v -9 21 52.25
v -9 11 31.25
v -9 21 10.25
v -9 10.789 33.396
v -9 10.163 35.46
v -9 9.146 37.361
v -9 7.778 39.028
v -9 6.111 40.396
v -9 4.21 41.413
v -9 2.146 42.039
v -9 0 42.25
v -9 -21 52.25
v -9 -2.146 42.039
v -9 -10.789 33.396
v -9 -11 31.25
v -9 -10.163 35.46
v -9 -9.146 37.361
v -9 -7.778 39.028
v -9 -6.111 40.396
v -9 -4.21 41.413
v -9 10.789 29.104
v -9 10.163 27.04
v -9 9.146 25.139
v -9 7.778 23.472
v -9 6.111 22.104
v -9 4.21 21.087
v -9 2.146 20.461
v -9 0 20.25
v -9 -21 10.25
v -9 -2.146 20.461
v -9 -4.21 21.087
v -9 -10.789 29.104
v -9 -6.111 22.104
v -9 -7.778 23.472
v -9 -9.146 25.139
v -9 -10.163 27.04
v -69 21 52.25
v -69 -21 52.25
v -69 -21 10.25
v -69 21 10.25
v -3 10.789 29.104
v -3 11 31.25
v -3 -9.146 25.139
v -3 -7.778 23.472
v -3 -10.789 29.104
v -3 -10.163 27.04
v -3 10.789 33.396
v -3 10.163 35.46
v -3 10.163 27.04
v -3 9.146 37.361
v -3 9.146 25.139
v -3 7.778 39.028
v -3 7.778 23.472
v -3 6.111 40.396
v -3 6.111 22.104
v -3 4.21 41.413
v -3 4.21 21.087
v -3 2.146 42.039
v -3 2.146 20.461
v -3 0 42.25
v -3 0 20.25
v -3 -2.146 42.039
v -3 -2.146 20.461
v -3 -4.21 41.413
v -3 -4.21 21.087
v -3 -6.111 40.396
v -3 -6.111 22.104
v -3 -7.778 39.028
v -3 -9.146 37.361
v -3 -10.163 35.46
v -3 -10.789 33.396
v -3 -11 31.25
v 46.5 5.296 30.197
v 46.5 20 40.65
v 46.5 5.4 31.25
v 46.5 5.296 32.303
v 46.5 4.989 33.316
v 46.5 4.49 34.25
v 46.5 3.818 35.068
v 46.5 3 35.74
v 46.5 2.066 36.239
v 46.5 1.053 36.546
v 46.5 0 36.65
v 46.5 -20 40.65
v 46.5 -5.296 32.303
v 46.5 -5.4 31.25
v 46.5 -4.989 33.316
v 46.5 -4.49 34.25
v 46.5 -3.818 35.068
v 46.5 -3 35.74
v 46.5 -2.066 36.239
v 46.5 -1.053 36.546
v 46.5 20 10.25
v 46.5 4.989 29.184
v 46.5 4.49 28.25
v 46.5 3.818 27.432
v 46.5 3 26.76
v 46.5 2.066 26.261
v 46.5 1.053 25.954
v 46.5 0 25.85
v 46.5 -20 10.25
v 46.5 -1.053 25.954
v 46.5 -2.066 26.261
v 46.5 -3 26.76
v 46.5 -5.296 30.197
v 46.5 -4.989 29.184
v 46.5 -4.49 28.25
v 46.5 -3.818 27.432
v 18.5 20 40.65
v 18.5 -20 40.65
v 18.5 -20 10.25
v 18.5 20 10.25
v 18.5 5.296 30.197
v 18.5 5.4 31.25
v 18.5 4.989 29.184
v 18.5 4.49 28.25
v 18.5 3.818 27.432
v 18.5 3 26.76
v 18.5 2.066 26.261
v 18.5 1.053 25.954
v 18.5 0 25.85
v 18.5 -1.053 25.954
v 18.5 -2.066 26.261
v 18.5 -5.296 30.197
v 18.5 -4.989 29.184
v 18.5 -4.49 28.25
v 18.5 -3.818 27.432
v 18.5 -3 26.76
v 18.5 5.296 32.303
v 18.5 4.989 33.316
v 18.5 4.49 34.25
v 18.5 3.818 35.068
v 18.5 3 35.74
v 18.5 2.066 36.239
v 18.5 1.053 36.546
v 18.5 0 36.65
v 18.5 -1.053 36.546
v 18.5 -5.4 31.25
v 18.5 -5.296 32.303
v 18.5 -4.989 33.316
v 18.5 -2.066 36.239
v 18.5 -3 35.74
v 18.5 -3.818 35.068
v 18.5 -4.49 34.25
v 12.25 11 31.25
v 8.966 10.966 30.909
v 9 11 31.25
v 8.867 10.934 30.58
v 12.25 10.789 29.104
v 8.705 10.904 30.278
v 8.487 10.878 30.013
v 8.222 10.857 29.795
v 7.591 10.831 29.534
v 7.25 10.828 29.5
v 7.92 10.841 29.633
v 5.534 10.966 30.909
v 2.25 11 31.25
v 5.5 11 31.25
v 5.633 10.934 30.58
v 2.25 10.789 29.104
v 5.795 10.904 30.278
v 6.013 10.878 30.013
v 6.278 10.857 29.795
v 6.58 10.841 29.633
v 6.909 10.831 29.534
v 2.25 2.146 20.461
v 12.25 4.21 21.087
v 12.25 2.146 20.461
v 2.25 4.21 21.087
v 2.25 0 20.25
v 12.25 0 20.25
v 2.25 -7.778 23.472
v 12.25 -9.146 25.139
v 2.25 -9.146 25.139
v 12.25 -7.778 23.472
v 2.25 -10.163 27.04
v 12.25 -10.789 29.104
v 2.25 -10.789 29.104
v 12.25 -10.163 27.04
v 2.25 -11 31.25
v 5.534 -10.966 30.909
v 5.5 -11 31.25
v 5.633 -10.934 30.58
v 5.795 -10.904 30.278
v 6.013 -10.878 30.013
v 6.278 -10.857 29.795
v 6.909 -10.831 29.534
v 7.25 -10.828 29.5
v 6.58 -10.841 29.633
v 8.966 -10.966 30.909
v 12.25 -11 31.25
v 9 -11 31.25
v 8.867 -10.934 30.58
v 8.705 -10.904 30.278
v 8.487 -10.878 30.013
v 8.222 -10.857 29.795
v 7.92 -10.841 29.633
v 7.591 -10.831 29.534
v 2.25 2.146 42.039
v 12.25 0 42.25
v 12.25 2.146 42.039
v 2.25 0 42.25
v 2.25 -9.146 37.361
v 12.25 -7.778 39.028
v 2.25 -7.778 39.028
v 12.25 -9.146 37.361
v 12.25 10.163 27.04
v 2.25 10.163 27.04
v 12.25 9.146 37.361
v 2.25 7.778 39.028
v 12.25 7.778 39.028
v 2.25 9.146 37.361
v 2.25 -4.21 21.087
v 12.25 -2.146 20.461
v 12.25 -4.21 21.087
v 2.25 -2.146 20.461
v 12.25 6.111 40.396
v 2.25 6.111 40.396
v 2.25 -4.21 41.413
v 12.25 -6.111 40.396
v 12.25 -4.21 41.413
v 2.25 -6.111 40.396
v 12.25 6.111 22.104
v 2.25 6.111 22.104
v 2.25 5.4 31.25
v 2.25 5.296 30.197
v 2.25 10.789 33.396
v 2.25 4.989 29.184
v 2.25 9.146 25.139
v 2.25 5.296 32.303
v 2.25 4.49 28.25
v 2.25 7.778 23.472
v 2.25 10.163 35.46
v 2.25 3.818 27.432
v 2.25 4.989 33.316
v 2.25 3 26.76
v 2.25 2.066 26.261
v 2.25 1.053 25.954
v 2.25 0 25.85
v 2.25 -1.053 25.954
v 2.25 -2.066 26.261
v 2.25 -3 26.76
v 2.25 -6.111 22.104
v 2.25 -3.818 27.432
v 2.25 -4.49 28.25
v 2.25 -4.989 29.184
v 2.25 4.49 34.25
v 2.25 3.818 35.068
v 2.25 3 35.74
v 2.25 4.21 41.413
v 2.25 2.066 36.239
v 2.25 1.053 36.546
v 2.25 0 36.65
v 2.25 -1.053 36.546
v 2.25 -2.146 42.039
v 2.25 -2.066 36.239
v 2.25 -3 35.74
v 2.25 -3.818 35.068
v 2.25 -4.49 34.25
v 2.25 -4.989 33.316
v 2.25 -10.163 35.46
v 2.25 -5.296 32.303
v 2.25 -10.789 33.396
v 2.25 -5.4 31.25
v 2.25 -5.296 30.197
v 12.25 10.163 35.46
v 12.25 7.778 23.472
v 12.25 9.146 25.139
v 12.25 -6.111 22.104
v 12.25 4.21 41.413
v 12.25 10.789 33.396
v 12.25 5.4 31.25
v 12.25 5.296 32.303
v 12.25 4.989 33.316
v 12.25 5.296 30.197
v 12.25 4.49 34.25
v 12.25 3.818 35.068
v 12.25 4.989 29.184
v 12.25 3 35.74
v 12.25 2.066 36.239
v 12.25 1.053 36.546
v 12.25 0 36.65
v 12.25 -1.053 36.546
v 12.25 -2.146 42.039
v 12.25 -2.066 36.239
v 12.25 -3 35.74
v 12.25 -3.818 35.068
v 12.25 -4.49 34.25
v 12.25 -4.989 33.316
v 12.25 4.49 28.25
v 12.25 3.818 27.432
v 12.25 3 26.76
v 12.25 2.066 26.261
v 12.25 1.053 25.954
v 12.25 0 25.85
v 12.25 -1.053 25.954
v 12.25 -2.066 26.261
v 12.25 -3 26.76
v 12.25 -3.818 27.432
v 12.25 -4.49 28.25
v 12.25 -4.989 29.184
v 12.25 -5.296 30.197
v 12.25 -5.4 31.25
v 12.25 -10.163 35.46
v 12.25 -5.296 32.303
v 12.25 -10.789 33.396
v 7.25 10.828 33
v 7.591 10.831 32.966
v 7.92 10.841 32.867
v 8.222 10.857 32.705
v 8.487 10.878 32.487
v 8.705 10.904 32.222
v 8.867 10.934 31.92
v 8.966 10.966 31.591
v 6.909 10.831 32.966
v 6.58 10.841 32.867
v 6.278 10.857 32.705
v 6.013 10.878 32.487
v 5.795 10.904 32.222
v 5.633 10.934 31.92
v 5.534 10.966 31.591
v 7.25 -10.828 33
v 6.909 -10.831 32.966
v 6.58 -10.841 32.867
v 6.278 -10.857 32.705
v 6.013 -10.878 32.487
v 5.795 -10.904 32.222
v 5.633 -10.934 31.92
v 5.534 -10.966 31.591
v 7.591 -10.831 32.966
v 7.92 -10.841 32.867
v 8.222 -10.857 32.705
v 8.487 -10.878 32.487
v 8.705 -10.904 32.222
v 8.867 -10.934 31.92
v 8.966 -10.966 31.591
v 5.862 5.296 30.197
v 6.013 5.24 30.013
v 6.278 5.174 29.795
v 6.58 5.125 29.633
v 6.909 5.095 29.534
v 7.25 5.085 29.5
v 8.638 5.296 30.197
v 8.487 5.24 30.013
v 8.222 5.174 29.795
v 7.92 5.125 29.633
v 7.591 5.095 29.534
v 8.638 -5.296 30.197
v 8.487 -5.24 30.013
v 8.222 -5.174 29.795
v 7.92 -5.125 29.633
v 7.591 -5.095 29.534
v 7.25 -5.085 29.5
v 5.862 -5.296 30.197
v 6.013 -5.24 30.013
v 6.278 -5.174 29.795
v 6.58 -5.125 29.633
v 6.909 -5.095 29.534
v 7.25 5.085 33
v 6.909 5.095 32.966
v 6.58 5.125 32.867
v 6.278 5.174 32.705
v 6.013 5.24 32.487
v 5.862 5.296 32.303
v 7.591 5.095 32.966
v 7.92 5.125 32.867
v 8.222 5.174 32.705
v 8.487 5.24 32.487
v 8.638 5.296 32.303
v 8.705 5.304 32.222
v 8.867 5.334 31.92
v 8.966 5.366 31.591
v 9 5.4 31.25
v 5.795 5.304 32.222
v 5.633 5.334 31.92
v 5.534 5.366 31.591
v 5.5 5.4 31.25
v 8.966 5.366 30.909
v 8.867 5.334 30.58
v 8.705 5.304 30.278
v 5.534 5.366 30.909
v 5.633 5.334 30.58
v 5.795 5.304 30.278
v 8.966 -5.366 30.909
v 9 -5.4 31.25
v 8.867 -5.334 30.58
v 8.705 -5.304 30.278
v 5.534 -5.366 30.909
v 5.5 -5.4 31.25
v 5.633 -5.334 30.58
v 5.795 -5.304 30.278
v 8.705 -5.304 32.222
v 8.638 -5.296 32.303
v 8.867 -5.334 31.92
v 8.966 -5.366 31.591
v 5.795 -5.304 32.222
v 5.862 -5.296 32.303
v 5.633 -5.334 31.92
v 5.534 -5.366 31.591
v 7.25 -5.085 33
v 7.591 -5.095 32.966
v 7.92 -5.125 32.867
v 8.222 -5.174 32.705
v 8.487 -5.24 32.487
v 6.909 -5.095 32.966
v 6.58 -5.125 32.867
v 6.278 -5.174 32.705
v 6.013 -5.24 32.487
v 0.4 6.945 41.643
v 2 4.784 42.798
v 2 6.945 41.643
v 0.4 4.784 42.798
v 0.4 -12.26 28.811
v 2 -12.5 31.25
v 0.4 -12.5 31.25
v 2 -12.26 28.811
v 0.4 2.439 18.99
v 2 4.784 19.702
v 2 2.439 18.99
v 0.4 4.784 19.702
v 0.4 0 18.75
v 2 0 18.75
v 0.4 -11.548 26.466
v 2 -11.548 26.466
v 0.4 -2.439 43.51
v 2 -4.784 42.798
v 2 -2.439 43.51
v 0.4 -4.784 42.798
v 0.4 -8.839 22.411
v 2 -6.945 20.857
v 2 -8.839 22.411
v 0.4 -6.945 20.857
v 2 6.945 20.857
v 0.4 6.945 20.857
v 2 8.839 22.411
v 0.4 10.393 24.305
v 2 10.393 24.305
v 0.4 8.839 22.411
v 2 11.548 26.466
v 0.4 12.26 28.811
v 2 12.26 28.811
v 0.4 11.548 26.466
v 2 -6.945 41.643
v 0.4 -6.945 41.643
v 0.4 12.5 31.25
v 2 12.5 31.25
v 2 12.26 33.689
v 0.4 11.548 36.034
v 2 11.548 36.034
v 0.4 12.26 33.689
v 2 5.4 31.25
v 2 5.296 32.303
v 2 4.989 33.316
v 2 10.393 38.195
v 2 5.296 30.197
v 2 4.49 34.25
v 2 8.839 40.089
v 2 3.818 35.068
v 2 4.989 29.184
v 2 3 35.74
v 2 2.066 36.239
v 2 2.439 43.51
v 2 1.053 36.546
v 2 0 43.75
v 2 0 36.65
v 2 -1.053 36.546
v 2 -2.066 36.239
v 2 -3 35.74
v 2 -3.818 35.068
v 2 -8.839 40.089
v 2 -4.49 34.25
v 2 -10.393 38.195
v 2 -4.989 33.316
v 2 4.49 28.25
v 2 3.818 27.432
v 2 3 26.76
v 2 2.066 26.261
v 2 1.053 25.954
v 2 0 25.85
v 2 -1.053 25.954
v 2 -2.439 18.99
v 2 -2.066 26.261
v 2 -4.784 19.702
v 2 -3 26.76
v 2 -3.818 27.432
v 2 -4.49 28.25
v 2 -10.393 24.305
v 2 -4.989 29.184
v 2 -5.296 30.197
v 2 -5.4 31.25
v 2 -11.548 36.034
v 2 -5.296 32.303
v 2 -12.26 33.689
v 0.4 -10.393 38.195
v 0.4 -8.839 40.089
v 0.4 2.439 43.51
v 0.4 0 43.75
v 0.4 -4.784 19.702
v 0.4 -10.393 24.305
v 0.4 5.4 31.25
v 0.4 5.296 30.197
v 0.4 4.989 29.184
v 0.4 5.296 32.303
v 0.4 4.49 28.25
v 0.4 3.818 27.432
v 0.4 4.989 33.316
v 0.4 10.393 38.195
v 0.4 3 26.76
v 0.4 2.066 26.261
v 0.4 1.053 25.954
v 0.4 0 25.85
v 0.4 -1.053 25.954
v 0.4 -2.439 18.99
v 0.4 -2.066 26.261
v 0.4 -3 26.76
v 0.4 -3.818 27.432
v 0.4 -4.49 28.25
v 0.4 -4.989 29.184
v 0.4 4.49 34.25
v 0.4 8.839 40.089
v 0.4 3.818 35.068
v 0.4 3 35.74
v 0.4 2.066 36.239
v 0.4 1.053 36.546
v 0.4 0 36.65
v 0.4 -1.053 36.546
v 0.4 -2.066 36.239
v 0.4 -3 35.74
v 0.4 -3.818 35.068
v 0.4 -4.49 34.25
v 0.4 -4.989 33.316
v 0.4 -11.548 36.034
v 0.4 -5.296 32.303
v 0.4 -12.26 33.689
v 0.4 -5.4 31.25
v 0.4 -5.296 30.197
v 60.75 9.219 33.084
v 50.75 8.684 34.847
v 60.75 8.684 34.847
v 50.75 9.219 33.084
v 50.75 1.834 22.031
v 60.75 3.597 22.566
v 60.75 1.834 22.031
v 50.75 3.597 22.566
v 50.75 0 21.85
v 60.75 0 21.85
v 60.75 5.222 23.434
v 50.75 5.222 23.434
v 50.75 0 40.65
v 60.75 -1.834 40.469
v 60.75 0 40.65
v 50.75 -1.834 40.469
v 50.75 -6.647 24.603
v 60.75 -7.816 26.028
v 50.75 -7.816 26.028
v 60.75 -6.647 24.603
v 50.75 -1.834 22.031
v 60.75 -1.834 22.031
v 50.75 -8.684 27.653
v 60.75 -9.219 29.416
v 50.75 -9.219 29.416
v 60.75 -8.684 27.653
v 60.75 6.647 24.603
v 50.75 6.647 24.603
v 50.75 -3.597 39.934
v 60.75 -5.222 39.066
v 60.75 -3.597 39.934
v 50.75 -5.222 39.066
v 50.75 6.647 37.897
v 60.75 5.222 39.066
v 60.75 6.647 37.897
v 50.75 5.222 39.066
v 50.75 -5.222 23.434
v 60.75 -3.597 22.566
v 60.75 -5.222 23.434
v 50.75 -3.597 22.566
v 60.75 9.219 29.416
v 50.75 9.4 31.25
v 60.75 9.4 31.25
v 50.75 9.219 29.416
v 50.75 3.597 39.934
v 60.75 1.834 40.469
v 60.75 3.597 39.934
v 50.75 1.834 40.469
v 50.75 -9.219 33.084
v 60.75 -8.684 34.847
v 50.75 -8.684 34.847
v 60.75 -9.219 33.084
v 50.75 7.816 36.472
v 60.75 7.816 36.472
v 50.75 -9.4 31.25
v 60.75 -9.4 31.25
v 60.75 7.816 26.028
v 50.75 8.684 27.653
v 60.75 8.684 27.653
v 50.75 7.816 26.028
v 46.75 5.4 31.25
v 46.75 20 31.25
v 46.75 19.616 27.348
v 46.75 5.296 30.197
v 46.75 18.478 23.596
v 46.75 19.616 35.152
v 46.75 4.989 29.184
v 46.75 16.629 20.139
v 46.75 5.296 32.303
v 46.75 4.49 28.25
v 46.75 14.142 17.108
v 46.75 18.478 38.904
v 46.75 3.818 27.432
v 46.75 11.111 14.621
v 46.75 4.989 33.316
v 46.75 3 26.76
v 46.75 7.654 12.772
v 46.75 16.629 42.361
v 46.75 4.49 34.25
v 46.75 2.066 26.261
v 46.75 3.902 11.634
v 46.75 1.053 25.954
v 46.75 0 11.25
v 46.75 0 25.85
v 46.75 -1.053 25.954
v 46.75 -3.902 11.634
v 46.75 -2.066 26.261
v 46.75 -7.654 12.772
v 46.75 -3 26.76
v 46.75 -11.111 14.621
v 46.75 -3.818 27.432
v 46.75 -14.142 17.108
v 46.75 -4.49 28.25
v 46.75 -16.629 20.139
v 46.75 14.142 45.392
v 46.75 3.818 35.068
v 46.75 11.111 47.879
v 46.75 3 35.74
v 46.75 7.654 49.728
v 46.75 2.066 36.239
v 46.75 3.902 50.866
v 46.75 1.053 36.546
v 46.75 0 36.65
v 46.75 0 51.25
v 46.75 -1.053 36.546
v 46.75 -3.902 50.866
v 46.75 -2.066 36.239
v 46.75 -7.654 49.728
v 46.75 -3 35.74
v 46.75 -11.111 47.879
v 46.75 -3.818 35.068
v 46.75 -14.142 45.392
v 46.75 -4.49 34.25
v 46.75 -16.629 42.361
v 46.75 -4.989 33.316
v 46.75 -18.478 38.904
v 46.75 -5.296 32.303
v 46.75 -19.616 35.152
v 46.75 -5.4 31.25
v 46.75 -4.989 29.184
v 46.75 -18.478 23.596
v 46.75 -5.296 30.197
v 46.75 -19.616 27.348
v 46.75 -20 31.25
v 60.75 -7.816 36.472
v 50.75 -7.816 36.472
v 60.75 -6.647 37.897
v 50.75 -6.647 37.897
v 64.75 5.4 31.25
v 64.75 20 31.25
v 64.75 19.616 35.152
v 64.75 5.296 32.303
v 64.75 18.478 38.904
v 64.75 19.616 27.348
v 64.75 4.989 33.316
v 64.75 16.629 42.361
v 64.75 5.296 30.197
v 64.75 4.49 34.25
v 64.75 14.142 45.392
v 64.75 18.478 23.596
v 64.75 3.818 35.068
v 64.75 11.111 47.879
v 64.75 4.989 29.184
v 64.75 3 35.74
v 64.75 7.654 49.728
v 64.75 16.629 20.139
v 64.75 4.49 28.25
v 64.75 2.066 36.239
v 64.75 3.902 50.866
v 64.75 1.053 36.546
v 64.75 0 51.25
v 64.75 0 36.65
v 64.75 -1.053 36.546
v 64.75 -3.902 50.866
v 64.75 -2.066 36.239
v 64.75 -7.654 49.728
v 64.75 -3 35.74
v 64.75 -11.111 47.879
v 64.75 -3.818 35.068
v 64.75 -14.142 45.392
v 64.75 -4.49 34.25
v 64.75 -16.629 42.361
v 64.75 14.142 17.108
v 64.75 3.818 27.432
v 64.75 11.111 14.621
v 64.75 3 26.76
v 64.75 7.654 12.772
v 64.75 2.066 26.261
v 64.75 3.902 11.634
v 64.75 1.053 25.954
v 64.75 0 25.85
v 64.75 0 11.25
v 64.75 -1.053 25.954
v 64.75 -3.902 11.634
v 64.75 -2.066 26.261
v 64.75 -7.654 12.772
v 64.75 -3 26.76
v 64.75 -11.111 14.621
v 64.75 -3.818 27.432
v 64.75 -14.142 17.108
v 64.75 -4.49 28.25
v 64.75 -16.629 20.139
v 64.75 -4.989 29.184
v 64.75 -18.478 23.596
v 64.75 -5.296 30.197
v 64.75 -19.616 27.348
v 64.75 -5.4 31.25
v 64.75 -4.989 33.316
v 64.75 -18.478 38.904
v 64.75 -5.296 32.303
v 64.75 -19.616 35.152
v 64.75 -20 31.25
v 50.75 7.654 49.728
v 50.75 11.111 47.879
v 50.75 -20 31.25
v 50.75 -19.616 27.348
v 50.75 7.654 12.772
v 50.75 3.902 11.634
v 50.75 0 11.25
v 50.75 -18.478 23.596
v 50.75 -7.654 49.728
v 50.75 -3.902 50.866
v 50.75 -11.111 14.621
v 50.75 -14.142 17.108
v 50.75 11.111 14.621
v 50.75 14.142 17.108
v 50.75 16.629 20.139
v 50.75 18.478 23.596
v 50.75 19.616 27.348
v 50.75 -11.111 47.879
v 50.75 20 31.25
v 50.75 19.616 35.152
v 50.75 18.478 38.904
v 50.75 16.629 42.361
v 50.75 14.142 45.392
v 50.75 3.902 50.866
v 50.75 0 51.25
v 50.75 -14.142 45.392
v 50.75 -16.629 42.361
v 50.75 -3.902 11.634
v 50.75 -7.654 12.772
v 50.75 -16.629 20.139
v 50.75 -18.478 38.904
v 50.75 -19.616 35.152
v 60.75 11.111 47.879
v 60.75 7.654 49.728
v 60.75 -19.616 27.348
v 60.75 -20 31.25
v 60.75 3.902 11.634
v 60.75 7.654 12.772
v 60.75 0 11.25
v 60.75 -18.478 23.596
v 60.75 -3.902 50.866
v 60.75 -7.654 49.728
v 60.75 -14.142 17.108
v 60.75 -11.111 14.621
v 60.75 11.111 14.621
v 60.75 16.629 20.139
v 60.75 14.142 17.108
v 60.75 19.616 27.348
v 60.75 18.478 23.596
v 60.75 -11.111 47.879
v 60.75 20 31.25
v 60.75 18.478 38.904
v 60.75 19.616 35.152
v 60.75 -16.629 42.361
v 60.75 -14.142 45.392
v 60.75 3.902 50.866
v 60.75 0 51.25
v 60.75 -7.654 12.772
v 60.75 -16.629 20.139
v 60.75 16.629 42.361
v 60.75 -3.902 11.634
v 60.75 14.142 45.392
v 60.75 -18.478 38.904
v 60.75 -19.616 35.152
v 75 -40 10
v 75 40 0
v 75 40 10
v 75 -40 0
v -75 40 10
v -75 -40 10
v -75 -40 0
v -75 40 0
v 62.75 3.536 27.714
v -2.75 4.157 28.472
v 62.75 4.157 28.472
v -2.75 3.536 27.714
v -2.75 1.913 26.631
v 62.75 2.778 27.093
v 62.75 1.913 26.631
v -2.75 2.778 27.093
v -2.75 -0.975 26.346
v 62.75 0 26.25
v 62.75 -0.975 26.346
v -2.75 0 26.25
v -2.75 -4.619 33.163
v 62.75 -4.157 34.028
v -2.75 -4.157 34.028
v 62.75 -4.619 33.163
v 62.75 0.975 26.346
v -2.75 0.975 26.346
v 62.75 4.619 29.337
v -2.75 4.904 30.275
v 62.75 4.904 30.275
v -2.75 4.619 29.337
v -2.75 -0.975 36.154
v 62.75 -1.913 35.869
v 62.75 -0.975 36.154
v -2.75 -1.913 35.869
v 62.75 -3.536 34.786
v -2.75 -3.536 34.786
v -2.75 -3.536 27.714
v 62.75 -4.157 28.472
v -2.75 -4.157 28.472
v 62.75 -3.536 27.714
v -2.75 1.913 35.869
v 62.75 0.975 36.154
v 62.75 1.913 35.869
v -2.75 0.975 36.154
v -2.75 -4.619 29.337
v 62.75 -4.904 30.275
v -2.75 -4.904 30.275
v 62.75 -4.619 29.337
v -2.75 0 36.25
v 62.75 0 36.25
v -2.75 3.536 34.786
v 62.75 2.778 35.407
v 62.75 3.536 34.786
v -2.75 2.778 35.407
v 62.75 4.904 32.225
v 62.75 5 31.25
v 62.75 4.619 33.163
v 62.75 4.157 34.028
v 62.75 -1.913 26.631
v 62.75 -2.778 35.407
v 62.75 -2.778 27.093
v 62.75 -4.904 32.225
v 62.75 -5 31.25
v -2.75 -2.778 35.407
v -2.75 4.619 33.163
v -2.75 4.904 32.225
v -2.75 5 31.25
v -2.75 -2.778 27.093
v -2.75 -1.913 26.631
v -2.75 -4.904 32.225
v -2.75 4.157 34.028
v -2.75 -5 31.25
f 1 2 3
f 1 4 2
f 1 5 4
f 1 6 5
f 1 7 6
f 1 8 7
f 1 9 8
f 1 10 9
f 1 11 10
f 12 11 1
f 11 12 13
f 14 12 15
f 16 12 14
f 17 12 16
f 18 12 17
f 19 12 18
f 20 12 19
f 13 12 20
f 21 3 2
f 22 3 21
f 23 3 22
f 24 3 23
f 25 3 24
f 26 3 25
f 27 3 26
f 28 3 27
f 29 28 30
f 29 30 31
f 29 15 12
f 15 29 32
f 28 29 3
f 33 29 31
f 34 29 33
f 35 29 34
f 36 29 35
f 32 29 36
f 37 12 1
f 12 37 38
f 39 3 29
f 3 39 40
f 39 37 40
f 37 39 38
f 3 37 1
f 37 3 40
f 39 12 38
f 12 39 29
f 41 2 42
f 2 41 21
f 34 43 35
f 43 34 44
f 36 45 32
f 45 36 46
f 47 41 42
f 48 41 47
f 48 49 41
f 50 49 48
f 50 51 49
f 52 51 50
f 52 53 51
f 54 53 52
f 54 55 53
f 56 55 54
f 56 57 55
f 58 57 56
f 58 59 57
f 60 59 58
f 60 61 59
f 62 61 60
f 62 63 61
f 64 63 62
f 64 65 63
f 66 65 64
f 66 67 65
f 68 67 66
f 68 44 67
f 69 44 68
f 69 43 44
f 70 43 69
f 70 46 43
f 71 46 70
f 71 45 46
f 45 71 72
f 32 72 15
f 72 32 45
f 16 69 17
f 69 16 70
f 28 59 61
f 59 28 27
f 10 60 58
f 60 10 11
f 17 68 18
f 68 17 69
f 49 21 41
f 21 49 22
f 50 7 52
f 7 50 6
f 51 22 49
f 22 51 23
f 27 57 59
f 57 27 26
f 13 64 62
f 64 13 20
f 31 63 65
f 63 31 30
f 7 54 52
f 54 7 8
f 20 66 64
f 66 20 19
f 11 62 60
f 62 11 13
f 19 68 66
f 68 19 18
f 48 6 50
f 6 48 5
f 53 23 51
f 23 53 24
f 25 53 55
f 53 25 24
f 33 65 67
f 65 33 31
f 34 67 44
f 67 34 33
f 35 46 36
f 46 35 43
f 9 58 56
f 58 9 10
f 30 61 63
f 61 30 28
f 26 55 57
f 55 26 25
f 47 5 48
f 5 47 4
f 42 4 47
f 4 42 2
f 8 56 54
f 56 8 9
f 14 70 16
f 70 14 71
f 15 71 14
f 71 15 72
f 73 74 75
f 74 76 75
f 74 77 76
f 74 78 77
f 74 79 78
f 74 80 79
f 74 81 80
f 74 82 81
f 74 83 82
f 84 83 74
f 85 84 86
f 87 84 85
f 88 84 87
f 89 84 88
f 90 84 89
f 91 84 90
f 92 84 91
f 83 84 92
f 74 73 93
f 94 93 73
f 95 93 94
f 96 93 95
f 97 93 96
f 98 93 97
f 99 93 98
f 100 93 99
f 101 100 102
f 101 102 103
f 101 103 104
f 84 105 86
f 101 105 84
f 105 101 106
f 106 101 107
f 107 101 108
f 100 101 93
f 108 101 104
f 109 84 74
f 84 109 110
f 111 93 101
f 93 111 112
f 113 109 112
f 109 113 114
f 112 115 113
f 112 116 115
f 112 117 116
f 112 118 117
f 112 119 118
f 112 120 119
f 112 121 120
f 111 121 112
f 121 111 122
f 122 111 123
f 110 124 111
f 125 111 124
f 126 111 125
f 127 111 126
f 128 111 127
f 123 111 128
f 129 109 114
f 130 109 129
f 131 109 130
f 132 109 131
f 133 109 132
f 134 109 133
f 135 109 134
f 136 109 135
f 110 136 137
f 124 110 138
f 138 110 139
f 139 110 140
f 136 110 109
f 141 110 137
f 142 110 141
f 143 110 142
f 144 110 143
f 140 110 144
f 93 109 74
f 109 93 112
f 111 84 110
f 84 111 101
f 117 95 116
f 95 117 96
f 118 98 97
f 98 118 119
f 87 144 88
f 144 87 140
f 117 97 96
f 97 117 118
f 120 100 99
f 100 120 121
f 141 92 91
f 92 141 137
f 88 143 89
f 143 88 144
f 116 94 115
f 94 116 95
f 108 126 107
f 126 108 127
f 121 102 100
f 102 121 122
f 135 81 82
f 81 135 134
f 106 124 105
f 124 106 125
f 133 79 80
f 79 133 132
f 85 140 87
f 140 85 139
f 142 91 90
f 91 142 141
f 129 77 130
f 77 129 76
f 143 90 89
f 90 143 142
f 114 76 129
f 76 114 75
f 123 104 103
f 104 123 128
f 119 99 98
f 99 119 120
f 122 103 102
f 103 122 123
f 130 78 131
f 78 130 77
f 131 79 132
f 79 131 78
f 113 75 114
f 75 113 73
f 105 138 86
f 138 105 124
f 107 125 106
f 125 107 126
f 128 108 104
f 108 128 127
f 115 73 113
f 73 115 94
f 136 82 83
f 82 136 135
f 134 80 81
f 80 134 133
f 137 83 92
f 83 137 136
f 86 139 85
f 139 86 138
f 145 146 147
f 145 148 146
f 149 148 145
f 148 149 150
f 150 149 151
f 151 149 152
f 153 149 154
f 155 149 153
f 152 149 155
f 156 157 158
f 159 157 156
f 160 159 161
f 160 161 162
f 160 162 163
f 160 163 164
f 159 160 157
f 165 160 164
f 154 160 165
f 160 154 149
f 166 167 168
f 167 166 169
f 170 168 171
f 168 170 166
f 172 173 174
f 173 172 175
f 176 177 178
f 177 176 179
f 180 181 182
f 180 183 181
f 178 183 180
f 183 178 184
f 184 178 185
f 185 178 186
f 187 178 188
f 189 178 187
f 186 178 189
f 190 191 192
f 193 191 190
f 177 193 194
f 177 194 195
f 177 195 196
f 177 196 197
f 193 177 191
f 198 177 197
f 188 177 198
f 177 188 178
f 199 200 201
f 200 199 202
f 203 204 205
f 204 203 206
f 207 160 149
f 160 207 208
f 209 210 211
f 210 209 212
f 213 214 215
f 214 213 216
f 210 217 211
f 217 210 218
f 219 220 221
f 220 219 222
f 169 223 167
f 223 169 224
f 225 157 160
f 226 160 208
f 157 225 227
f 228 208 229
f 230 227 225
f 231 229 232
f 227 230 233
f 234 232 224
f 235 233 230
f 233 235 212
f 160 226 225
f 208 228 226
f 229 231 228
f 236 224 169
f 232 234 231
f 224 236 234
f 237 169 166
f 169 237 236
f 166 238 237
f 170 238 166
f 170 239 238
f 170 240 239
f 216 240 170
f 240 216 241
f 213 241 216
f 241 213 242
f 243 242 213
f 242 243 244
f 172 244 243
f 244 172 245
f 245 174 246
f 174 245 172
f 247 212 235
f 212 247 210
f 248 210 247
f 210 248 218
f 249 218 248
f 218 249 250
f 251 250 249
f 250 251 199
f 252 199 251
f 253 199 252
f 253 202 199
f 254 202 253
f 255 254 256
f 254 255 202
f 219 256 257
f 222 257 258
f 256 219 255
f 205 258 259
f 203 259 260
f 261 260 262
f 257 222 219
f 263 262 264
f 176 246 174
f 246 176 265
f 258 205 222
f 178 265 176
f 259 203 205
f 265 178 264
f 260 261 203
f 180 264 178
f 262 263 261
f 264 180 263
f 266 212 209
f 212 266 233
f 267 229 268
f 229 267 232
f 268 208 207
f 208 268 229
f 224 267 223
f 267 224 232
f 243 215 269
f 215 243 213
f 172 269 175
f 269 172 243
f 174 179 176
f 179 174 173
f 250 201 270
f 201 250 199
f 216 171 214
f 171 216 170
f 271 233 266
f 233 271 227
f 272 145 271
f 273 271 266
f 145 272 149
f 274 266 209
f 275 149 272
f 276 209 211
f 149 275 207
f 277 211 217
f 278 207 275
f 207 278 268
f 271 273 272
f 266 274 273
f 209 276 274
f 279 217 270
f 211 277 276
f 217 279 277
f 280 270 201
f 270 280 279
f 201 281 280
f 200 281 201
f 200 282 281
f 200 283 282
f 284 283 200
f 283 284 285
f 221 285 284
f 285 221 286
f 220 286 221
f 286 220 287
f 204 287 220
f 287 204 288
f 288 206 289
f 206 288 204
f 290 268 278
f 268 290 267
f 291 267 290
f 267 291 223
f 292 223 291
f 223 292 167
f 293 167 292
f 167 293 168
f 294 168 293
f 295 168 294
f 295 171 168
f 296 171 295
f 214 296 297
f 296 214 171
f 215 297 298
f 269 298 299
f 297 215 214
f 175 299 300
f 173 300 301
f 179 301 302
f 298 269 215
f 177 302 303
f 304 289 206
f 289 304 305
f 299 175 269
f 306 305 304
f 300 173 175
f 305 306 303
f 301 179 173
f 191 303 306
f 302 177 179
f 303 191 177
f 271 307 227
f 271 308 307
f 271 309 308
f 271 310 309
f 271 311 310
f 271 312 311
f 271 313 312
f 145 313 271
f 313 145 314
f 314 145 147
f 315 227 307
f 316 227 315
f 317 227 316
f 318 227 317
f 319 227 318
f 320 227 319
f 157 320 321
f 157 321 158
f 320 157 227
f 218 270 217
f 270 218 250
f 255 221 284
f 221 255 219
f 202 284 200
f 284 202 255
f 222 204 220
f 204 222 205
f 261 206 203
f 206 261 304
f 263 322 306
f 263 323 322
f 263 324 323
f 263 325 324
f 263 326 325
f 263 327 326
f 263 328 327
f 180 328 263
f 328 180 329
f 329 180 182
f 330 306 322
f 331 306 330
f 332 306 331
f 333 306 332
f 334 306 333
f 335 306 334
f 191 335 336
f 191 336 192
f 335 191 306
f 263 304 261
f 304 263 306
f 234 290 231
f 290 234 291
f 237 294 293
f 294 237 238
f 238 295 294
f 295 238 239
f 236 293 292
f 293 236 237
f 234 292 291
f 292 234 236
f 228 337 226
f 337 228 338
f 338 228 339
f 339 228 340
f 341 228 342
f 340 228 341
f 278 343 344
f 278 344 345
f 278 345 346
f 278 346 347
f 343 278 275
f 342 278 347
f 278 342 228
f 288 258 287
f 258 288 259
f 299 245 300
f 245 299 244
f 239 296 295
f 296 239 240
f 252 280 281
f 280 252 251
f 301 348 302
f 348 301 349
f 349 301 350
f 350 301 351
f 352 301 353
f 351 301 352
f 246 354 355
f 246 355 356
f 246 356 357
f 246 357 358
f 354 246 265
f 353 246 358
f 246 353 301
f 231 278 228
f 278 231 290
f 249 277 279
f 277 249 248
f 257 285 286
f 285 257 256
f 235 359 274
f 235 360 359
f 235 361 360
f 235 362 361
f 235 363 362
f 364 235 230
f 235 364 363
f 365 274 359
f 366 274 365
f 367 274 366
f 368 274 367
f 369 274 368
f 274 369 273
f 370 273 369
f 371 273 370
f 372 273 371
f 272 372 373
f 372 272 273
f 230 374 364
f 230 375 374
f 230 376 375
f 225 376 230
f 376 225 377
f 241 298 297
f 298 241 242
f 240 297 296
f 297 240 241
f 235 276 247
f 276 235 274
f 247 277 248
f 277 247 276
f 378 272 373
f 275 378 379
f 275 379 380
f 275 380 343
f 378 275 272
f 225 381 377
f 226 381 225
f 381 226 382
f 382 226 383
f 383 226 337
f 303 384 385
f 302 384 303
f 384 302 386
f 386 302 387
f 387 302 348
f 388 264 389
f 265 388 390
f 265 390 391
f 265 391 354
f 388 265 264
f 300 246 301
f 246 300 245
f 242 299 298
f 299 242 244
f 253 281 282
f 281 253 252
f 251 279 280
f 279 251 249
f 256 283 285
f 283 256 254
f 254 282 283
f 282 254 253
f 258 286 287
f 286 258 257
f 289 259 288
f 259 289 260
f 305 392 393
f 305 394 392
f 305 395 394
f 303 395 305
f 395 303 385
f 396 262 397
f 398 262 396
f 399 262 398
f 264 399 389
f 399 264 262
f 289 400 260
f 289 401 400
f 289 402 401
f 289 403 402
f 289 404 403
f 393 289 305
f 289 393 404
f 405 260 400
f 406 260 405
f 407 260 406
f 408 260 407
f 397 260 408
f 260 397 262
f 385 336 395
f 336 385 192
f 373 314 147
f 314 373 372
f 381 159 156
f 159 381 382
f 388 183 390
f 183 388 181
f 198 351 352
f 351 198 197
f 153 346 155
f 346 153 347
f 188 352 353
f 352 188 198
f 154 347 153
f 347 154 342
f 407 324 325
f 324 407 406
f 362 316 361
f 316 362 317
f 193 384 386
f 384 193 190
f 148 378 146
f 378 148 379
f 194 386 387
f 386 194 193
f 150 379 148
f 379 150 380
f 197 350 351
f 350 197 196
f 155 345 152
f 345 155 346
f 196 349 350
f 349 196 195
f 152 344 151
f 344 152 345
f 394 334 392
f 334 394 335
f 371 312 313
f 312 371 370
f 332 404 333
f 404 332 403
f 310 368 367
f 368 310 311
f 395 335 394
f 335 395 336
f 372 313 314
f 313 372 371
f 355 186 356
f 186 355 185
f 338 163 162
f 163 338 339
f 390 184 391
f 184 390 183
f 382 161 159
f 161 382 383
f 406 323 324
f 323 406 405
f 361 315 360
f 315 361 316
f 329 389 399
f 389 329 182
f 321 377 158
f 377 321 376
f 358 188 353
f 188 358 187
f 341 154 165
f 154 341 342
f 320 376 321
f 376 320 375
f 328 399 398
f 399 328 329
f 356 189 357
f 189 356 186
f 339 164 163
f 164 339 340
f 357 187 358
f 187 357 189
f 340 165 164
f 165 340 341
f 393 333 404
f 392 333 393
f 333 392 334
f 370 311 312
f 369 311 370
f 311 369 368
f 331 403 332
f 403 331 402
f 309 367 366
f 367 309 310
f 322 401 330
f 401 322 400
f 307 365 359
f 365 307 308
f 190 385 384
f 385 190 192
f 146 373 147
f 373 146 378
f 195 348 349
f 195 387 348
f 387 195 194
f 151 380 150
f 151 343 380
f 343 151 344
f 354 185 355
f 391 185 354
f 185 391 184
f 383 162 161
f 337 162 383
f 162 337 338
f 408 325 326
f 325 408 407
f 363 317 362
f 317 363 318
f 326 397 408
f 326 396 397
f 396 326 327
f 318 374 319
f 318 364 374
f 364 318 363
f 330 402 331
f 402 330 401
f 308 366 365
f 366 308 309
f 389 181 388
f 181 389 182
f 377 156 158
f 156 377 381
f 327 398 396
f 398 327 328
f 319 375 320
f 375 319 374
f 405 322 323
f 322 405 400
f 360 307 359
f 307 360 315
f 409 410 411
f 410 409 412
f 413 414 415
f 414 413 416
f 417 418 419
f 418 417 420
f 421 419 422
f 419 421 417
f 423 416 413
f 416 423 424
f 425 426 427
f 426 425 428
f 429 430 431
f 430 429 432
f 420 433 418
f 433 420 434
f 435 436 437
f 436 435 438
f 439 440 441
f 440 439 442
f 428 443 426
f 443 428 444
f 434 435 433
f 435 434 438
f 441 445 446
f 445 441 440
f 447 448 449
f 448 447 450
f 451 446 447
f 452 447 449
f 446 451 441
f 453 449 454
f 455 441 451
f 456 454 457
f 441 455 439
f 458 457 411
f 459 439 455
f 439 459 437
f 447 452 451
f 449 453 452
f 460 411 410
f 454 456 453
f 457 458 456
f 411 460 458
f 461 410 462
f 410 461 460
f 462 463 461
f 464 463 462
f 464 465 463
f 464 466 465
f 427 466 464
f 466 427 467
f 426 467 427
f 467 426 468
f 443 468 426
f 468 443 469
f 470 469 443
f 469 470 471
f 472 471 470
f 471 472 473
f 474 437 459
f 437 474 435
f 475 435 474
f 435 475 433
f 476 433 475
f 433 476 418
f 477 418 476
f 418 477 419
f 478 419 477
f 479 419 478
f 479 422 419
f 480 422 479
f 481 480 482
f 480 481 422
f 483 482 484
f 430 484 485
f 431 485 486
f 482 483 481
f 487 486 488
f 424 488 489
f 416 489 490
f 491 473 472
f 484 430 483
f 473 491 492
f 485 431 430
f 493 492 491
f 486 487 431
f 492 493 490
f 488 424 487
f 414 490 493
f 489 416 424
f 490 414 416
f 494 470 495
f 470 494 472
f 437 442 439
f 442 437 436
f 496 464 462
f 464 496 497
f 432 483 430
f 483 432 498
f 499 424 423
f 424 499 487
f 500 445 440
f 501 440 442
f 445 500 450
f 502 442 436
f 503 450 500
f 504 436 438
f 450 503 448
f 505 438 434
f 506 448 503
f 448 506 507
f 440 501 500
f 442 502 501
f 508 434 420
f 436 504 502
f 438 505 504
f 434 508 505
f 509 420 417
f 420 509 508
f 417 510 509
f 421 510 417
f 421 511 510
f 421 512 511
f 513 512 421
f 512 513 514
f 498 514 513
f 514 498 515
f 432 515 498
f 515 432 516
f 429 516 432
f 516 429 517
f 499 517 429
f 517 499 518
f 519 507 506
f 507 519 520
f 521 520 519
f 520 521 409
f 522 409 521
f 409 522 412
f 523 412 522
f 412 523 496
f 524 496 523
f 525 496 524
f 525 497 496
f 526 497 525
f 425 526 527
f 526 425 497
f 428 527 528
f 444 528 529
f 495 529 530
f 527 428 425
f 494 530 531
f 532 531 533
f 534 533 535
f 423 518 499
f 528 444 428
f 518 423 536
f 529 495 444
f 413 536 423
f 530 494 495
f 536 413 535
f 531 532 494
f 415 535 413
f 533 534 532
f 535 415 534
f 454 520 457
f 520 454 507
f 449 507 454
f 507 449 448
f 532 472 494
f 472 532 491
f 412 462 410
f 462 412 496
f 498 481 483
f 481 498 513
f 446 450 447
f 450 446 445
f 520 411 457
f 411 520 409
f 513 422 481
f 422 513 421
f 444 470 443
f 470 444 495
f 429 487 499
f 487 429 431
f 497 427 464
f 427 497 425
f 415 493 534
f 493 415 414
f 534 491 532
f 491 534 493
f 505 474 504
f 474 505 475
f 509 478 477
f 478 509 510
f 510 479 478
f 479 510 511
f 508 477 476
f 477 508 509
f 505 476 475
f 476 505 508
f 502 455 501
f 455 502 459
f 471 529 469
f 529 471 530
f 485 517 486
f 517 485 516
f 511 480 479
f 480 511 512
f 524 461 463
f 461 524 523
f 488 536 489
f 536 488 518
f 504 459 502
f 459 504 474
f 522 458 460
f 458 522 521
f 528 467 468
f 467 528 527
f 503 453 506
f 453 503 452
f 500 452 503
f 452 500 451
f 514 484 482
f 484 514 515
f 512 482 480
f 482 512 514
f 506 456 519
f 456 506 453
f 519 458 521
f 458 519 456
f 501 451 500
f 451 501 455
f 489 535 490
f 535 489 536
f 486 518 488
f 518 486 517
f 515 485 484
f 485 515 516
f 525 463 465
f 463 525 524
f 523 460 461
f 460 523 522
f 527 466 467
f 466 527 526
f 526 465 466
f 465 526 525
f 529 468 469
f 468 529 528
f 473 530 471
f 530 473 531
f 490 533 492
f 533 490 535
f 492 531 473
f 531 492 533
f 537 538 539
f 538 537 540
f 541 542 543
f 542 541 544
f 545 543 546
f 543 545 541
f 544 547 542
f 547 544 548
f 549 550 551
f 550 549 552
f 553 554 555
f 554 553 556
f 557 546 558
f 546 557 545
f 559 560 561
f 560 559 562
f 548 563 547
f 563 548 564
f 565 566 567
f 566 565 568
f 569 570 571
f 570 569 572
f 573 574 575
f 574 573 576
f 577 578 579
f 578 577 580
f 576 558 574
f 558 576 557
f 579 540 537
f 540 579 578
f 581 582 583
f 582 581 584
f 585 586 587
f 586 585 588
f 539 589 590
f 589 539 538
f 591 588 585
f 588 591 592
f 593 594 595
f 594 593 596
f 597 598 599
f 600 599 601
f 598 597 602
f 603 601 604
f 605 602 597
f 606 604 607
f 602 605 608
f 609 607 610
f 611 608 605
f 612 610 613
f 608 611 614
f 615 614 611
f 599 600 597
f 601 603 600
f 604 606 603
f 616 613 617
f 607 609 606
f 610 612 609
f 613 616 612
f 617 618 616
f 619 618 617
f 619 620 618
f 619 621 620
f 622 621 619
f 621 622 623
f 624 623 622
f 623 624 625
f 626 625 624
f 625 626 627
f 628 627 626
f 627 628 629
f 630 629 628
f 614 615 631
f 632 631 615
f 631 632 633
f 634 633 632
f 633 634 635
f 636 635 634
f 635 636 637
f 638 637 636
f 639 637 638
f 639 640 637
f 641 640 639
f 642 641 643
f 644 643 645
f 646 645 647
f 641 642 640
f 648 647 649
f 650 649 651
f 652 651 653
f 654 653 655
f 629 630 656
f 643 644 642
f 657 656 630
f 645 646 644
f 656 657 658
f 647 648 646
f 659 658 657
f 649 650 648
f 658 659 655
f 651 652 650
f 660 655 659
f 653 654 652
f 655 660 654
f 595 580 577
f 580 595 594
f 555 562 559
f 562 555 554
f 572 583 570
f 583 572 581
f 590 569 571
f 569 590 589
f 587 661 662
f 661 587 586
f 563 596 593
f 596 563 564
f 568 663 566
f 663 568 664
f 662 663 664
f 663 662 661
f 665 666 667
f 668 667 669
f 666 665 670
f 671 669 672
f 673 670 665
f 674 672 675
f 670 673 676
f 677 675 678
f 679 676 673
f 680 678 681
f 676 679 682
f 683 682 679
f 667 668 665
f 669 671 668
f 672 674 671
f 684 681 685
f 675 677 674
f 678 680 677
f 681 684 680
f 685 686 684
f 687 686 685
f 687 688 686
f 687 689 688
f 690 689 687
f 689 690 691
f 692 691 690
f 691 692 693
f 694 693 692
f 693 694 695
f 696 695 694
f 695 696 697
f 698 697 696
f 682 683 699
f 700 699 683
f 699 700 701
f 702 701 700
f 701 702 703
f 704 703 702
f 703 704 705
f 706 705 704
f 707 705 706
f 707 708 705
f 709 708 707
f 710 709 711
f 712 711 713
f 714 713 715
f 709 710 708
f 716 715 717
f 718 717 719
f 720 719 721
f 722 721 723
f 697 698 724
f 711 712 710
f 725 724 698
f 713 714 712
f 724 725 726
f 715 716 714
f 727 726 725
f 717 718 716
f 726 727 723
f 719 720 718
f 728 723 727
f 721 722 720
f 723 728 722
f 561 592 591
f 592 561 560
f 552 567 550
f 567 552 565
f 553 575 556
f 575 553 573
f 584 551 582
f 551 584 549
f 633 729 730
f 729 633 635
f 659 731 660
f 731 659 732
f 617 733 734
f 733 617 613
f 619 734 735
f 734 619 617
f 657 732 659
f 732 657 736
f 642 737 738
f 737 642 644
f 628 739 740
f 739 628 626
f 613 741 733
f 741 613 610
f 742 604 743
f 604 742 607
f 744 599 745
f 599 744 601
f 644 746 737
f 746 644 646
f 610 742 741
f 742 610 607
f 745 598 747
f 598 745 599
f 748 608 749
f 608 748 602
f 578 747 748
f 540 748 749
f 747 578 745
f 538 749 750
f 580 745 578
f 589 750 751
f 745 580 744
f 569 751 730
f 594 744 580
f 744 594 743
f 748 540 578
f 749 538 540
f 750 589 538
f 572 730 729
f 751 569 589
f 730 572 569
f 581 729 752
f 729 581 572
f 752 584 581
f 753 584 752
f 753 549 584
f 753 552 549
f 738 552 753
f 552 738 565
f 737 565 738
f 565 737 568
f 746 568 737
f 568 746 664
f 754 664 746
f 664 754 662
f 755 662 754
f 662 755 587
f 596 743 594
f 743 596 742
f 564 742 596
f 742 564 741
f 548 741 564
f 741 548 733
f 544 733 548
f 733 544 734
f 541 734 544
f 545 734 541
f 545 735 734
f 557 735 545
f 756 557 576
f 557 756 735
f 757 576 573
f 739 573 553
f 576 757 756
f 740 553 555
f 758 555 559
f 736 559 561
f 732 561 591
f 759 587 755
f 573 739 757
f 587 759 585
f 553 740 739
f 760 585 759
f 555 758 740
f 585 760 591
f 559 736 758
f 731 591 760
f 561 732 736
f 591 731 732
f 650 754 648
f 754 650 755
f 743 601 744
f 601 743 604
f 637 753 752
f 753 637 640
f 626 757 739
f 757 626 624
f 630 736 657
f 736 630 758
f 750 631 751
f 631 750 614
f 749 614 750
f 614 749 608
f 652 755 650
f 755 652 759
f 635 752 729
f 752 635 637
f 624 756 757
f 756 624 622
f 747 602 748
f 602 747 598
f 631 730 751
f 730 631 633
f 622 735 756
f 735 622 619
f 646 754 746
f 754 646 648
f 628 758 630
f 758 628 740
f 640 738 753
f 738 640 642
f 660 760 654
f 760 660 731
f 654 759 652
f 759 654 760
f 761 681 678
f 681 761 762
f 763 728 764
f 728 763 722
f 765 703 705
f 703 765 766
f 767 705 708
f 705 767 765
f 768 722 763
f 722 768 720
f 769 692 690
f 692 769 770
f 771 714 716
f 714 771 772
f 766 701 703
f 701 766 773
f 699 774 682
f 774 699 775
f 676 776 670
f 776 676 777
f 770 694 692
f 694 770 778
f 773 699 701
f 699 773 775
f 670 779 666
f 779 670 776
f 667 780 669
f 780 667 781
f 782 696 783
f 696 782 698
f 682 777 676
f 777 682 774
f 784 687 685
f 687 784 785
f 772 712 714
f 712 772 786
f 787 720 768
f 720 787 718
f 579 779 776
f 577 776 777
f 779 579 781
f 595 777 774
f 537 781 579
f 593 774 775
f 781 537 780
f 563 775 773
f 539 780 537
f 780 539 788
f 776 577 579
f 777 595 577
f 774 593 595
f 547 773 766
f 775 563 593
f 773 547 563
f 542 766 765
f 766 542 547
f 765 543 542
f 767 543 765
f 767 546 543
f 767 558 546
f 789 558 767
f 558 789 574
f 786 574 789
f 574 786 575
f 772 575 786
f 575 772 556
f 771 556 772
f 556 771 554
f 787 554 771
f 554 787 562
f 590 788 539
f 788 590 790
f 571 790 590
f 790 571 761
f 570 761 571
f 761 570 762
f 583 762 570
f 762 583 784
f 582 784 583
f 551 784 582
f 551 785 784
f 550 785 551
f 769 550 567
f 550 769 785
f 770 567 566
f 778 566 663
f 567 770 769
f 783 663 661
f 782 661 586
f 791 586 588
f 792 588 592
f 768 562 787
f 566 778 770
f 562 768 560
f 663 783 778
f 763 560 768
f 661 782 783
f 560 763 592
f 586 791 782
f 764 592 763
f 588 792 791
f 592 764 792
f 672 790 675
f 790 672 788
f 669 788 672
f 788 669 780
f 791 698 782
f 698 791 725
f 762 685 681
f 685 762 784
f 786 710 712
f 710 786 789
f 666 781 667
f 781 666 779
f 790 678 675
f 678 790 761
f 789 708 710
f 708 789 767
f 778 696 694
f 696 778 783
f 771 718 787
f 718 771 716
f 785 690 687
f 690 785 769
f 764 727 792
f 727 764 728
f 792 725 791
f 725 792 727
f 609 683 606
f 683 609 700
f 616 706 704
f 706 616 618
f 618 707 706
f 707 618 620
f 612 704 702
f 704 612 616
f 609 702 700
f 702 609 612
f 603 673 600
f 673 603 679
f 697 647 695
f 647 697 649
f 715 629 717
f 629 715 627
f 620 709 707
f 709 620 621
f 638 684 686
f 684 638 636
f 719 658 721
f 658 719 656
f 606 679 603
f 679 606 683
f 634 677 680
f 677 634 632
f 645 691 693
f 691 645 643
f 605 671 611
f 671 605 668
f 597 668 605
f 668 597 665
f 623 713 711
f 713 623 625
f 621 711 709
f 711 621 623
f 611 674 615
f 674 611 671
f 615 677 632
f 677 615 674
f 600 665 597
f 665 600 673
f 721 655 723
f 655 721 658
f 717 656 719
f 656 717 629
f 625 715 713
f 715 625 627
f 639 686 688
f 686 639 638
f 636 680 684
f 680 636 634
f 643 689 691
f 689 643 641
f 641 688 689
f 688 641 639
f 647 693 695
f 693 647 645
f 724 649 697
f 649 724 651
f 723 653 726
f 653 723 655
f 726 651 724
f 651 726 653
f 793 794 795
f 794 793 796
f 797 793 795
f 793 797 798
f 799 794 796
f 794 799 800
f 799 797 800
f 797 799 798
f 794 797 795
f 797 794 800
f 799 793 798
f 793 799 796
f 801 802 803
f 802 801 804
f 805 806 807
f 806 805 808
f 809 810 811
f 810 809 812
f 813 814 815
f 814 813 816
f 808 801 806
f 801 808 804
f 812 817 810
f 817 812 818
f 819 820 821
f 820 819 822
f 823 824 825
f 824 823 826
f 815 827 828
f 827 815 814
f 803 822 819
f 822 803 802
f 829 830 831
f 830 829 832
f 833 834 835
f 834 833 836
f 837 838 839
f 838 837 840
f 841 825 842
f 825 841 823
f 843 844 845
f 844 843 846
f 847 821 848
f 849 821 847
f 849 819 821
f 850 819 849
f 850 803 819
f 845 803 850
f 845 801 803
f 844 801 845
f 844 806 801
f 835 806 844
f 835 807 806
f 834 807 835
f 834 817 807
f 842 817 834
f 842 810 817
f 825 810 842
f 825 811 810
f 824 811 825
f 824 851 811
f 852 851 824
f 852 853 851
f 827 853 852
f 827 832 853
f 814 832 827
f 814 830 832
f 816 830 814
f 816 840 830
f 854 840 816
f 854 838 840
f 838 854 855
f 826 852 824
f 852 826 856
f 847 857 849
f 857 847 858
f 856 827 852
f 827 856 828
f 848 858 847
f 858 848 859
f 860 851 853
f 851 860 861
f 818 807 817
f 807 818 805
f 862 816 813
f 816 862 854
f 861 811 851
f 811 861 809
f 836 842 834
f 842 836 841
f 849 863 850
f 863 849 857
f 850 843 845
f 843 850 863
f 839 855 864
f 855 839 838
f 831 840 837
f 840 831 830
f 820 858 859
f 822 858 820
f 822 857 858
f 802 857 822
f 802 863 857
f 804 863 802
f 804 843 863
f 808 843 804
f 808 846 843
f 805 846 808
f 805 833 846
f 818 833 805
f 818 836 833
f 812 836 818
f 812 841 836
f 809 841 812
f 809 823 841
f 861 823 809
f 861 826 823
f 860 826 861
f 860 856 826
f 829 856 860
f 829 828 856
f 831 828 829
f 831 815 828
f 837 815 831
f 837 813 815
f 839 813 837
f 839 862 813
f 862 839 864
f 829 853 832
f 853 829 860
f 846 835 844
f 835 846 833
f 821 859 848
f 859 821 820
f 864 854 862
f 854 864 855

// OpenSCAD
$fn = 32;

// ------------------------------------------------------------------------
// Motor drive station: motor 60 x 42 mm, shaft d10, pulley d40
// Every part is its own module, assembly() places every instance.
// ------------------------------------------------------------------------

// --- part 1 ---
module station_bed() {
  difference() {
    translate([-75, -40, 0]) cube([150, 80, 10]);
  }
}

// --- part 2 ---
module drive_motor() {
  union() {
    translate([-30, -21, 0]) cube([60, 42, 42]);
    translate([33, 0, 21]) rotate([0, 90, 0]) cylinder(h = 6, d = 22, center = true);
  }
}

// --- part 3 ---
module pillow_block() {
  difference() {
    translate([-14, -20, 0]) cube([28, 40, 30.4]);
    translate([0, 0, 21]) rotate([0, 90, 0]) cylinder(h = 30, d = 10.8, center = true);
  }
}

// --- part 4 ---
module drive_shaft() {
  translate([0, 0, -32.75]) cylinder(h = 65.5, d = 10);
}

// --- part 5 ---
module shaft_collar() {
  difference() {
    cylinder(h = 10, d = 22);
    translate([0, 0, -1]) cylinder(h = 12, d = 10.8);
    translate([0, 0, 5]) rotate([90, 0, 0]) cylinder(h = 24, d = 3.5, center = true);
  }
}

// --- part 6 ---
module collar_washer() {
  difference() {
      translate([0, 0, 0]) cylinder(h = 1.6, d = 25);
      translate([0, 0, -1]) cylinder(h = 3.6, d = 10.8);
    }
}

// --- part 7 ---
module drive_pulley() {
  difference() {
    union() {
      cylinder(h = 18, d = 18.8);
      cylinder(h = 4, d = 40);
      translate([0, 0, 14]) cylinder(h = 4, d = 40);
    }
    translate([0, 0, -1]) cylinder(h = 20, d = 10.8);
  }
}

// --- assembly ---
module assembly() {
  color([0.80, 0.24, 0.20]) translate([0, 0, 0]) rotate([0, 0, 0]) station_bed();
  color([0.20, 0.45, 0.75]) translate([-39, 0, 10.25]) rotate([0, 0, 0]) drive_motor();
  color([0.25, 0.62, 0.32]) translate([32.5, 0, 10.25]) rotate([0, 0, 0]) pillow_block();
  color([0.92, 0.70, 0.18]) translate([30, 0, 31.25]) rotate([0, 90, 0]) drive_shaft();
  color([0.58, 0.35, 0.70]) translate([2.25, 0, 31.25]) rotate([0, 90, 0]) shaft_collar();
  color([0.16, 0.66, 0.66]) translate([0.4, 0, 31.25]) rotate([0, 90, 0]) collar_washer();
  color([0.85, 0.48, 0.18]) translate([46.75, 0, 31.25]) rotate([0, 90, 0]) drive_pulley();
}

assembly();
